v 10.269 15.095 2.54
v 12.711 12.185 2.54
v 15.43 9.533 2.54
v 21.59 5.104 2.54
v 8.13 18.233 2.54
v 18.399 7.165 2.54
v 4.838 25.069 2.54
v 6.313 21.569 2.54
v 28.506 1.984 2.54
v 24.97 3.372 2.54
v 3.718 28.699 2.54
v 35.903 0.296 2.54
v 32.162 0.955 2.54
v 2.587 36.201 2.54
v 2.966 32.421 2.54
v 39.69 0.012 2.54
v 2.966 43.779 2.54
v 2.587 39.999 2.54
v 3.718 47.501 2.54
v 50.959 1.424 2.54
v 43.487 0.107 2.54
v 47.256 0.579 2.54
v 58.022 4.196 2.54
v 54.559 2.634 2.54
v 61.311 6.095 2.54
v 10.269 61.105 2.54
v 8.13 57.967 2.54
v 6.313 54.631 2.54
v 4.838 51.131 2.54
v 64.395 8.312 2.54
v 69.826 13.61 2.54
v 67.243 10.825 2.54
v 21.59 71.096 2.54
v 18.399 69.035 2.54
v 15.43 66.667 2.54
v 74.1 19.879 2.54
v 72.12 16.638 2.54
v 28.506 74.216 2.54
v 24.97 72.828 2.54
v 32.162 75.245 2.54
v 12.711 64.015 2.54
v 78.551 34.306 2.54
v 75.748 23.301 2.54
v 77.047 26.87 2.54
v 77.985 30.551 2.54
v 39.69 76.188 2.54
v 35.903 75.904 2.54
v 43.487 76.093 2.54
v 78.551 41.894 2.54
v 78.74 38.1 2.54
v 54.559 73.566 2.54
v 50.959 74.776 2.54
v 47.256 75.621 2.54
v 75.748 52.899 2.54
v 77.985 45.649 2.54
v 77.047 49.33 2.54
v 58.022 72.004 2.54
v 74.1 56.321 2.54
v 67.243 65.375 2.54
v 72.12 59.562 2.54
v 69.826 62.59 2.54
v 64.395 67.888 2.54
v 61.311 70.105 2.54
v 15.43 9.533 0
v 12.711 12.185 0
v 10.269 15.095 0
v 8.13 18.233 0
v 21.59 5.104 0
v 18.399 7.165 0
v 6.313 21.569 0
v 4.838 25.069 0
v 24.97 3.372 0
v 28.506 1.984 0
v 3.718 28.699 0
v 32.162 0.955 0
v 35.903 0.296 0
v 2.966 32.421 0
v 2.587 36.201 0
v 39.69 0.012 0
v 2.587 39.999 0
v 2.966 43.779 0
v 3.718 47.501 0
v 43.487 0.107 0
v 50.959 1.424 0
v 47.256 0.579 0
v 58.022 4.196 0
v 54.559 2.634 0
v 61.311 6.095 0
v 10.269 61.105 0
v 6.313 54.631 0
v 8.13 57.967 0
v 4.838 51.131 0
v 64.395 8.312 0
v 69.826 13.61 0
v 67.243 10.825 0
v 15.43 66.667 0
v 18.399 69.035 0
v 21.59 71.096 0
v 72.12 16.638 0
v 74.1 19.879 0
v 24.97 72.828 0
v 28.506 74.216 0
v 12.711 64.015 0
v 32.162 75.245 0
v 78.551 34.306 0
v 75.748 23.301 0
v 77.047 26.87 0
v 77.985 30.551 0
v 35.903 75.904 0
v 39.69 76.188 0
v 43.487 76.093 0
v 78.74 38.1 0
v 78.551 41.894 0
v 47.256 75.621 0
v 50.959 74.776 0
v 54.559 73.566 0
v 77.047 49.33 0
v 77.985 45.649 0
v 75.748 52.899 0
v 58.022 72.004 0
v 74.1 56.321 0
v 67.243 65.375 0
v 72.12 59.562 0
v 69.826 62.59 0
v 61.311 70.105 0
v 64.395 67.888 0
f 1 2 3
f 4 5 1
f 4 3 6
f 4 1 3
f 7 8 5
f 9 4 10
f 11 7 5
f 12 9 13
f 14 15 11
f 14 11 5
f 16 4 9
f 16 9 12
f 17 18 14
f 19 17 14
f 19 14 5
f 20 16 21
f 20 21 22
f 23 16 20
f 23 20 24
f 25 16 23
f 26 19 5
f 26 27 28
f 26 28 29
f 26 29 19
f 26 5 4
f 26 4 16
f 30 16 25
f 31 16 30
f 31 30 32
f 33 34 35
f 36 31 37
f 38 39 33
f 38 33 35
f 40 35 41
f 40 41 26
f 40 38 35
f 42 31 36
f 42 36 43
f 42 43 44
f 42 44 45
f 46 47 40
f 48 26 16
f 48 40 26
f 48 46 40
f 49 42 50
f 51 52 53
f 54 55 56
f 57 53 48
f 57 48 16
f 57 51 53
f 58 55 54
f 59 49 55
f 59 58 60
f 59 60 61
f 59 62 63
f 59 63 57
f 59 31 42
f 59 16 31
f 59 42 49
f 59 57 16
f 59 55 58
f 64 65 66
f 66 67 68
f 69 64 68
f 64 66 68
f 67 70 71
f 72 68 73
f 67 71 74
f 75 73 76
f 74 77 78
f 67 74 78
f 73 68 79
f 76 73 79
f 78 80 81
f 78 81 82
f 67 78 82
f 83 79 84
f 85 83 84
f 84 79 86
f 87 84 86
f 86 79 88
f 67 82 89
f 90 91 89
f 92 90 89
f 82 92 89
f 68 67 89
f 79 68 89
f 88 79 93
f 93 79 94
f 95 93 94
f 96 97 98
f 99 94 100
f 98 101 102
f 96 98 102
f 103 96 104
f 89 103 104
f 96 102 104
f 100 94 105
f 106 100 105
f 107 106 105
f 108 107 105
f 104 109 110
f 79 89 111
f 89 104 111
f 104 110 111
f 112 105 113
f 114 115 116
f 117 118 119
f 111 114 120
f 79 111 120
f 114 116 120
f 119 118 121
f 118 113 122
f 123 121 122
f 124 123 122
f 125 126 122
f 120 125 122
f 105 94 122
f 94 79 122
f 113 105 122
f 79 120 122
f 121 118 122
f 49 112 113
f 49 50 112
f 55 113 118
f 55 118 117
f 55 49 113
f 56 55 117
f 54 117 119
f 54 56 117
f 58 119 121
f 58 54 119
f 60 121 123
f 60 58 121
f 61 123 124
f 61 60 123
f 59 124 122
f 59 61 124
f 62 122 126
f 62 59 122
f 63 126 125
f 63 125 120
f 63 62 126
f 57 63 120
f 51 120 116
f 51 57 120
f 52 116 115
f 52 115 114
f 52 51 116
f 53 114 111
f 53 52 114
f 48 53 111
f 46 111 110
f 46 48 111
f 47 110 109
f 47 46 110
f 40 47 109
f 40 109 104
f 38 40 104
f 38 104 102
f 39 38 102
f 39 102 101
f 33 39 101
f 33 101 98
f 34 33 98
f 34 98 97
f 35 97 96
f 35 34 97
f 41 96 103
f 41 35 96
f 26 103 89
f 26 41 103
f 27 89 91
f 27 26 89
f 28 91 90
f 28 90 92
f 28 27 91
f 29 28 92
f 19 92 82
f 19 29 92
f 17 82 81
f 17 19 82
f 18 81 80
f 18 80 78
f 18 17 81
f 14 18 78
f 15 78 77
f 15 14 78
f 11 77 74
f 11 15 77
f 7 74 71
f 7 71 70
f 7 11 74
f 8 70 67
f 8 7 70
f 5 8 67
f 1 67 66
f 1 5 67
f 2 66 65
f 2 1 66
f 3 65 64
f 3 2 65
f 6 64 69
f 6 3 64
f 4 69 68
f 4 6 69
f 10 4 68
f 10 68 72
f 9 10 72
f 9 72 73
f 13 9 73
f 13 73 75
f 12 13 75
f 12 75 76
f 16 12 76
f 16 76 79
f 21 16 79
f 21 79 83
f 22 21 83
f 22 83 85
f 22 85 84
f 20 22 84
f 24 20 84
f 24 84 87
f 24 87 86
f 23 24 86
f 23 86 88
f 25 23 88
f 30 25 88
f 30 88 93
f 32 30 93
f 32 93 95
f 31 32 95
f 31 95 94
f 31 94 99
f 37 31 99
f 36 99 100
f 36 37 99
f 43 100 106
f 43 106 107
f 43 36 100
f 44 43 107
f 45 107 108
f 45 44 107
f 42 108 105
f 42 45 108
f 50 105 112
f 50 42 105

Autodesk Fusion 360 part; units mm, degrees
cylinder "CylinderPrimitive1" add diameter 76.2 height 2.54 placed x (1, 0, 0) y (0, 1, 0) z (0, 0, 1) at (40.64, 38.1, 0) in component "Disk"
component "Disk" placed x (1, 0, 0) y (0, 1, 0) z (0, 0, 1) at (0, 0, 0)
component "Component" placed x (1, 0, 0) y (0, 1, 0) z (0, 0, 1) at (0, 0, 0)
